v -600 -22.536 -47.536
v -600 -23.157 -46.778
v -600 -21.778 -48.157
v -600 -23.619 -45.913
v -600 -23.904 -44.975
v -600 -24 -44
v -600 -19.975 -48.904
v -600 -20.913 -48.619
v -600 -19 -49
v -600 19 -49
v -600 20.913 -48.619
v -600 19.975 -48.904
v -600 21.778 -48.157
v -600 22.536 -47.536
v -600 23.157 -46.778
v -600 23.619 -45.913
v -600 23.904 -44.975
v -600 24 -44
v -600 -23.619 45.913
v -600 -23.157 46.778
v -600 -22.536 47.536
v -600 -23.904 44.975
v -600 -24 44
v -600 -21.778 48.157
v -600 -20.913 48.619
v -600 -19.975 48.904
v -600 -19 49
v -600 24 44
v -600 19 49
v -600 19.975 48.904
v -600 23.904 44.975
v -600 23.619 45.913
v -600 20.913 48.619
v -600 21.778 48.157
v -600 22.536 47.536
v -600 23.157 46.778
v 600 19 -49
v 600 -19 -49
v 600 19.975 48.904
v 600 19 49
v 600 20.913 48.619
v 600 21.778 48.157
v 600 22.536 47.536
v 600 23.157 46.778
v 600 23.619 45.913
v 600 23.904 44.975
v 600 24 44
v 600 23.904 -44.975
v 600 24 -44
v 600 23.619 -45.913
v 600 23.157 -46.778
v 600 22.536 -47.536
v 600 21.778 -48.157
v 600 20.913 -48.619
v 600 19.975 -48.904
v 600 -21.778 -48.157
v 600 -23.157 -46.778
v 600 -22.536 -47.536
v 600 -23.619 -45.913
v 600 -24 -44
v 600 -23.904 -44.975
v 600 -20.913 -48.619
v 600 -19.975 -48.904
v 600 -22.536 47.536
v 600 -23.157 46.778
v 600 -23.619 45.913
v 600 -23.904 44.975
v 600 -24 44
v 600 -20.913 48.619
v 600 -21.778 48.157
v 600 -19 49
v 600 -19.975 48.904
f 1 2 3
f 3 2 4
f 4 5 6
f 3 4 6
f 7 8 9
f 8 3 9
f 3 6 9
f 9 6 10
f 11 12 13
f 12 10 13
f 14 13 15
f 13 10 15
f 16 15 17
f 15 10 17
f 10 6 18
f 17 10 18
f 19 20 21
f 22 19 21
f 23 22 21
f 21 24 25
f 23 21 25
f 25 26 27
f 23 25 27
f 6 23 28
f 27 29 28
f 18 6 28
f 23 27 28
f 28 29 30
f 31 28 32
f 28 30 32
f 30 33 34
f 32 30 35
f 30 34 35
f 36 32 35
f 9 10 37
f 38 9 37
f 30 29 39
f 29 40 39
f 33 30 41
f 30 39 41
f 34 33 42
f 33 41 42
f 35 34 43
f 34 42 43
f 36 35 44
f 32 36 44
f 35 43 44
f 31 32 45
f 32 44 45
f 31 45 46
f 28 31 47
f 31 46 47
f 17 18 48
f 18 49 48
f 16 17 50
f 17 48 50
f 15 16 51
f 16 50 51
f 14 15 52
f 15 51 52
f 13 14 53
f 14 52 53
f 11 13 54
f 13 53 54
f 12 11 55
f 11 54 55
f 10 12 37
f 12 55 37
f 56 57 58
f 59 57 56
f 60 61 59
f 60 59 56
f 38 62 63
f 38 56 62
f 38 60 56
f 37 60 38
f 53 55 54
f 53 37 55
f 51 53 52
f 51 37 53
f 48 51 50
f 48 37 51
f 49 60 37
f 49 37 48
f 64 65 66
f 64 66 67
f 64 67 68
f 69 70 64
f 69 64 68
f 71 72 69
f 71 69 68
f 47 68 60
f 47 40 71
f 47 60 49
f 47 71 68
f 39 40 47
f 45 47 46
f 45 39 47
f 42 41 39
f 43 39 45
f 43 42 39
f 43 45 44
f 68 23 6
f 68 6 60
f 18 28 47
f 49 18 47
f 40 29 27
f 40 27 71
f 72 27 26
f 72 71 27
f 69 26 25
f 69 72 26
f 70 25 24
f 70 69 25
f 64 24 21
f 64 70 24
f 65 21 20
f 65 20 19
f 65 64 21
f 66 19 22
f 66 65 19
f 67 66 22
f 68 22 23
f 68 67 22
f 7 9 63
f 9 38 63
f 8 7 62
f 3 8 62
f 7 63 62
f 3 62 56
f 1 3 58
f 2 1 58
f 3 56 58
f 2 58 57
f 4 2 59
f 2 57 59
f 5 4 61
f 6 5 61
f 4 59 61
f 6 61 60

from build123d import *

# Parameters (mm, degrees)
F0_W     = 1200
F0_H     = 48
F1_DEPTH = 49
F2_R     = 5


with BuildPart() as f1:
    # F0 (on Top) → F1 (new body, symmetric)
    with BuildSketch(Plane.XY):
        Rectangle(F0_W, F0_H)
    extrude(amount=F1_DEPTH, both=True)

    # F2
    f2_edges = [f1.edges().sort_by_distance(p)[0] for p in [
        (0, -24, 49),
        (0, 24, 49),
        (0, -24, -49),
        (0, 24, -49),
    ]]
    fillet(f2_edges, radius=F2_R)


solid = f1.part
